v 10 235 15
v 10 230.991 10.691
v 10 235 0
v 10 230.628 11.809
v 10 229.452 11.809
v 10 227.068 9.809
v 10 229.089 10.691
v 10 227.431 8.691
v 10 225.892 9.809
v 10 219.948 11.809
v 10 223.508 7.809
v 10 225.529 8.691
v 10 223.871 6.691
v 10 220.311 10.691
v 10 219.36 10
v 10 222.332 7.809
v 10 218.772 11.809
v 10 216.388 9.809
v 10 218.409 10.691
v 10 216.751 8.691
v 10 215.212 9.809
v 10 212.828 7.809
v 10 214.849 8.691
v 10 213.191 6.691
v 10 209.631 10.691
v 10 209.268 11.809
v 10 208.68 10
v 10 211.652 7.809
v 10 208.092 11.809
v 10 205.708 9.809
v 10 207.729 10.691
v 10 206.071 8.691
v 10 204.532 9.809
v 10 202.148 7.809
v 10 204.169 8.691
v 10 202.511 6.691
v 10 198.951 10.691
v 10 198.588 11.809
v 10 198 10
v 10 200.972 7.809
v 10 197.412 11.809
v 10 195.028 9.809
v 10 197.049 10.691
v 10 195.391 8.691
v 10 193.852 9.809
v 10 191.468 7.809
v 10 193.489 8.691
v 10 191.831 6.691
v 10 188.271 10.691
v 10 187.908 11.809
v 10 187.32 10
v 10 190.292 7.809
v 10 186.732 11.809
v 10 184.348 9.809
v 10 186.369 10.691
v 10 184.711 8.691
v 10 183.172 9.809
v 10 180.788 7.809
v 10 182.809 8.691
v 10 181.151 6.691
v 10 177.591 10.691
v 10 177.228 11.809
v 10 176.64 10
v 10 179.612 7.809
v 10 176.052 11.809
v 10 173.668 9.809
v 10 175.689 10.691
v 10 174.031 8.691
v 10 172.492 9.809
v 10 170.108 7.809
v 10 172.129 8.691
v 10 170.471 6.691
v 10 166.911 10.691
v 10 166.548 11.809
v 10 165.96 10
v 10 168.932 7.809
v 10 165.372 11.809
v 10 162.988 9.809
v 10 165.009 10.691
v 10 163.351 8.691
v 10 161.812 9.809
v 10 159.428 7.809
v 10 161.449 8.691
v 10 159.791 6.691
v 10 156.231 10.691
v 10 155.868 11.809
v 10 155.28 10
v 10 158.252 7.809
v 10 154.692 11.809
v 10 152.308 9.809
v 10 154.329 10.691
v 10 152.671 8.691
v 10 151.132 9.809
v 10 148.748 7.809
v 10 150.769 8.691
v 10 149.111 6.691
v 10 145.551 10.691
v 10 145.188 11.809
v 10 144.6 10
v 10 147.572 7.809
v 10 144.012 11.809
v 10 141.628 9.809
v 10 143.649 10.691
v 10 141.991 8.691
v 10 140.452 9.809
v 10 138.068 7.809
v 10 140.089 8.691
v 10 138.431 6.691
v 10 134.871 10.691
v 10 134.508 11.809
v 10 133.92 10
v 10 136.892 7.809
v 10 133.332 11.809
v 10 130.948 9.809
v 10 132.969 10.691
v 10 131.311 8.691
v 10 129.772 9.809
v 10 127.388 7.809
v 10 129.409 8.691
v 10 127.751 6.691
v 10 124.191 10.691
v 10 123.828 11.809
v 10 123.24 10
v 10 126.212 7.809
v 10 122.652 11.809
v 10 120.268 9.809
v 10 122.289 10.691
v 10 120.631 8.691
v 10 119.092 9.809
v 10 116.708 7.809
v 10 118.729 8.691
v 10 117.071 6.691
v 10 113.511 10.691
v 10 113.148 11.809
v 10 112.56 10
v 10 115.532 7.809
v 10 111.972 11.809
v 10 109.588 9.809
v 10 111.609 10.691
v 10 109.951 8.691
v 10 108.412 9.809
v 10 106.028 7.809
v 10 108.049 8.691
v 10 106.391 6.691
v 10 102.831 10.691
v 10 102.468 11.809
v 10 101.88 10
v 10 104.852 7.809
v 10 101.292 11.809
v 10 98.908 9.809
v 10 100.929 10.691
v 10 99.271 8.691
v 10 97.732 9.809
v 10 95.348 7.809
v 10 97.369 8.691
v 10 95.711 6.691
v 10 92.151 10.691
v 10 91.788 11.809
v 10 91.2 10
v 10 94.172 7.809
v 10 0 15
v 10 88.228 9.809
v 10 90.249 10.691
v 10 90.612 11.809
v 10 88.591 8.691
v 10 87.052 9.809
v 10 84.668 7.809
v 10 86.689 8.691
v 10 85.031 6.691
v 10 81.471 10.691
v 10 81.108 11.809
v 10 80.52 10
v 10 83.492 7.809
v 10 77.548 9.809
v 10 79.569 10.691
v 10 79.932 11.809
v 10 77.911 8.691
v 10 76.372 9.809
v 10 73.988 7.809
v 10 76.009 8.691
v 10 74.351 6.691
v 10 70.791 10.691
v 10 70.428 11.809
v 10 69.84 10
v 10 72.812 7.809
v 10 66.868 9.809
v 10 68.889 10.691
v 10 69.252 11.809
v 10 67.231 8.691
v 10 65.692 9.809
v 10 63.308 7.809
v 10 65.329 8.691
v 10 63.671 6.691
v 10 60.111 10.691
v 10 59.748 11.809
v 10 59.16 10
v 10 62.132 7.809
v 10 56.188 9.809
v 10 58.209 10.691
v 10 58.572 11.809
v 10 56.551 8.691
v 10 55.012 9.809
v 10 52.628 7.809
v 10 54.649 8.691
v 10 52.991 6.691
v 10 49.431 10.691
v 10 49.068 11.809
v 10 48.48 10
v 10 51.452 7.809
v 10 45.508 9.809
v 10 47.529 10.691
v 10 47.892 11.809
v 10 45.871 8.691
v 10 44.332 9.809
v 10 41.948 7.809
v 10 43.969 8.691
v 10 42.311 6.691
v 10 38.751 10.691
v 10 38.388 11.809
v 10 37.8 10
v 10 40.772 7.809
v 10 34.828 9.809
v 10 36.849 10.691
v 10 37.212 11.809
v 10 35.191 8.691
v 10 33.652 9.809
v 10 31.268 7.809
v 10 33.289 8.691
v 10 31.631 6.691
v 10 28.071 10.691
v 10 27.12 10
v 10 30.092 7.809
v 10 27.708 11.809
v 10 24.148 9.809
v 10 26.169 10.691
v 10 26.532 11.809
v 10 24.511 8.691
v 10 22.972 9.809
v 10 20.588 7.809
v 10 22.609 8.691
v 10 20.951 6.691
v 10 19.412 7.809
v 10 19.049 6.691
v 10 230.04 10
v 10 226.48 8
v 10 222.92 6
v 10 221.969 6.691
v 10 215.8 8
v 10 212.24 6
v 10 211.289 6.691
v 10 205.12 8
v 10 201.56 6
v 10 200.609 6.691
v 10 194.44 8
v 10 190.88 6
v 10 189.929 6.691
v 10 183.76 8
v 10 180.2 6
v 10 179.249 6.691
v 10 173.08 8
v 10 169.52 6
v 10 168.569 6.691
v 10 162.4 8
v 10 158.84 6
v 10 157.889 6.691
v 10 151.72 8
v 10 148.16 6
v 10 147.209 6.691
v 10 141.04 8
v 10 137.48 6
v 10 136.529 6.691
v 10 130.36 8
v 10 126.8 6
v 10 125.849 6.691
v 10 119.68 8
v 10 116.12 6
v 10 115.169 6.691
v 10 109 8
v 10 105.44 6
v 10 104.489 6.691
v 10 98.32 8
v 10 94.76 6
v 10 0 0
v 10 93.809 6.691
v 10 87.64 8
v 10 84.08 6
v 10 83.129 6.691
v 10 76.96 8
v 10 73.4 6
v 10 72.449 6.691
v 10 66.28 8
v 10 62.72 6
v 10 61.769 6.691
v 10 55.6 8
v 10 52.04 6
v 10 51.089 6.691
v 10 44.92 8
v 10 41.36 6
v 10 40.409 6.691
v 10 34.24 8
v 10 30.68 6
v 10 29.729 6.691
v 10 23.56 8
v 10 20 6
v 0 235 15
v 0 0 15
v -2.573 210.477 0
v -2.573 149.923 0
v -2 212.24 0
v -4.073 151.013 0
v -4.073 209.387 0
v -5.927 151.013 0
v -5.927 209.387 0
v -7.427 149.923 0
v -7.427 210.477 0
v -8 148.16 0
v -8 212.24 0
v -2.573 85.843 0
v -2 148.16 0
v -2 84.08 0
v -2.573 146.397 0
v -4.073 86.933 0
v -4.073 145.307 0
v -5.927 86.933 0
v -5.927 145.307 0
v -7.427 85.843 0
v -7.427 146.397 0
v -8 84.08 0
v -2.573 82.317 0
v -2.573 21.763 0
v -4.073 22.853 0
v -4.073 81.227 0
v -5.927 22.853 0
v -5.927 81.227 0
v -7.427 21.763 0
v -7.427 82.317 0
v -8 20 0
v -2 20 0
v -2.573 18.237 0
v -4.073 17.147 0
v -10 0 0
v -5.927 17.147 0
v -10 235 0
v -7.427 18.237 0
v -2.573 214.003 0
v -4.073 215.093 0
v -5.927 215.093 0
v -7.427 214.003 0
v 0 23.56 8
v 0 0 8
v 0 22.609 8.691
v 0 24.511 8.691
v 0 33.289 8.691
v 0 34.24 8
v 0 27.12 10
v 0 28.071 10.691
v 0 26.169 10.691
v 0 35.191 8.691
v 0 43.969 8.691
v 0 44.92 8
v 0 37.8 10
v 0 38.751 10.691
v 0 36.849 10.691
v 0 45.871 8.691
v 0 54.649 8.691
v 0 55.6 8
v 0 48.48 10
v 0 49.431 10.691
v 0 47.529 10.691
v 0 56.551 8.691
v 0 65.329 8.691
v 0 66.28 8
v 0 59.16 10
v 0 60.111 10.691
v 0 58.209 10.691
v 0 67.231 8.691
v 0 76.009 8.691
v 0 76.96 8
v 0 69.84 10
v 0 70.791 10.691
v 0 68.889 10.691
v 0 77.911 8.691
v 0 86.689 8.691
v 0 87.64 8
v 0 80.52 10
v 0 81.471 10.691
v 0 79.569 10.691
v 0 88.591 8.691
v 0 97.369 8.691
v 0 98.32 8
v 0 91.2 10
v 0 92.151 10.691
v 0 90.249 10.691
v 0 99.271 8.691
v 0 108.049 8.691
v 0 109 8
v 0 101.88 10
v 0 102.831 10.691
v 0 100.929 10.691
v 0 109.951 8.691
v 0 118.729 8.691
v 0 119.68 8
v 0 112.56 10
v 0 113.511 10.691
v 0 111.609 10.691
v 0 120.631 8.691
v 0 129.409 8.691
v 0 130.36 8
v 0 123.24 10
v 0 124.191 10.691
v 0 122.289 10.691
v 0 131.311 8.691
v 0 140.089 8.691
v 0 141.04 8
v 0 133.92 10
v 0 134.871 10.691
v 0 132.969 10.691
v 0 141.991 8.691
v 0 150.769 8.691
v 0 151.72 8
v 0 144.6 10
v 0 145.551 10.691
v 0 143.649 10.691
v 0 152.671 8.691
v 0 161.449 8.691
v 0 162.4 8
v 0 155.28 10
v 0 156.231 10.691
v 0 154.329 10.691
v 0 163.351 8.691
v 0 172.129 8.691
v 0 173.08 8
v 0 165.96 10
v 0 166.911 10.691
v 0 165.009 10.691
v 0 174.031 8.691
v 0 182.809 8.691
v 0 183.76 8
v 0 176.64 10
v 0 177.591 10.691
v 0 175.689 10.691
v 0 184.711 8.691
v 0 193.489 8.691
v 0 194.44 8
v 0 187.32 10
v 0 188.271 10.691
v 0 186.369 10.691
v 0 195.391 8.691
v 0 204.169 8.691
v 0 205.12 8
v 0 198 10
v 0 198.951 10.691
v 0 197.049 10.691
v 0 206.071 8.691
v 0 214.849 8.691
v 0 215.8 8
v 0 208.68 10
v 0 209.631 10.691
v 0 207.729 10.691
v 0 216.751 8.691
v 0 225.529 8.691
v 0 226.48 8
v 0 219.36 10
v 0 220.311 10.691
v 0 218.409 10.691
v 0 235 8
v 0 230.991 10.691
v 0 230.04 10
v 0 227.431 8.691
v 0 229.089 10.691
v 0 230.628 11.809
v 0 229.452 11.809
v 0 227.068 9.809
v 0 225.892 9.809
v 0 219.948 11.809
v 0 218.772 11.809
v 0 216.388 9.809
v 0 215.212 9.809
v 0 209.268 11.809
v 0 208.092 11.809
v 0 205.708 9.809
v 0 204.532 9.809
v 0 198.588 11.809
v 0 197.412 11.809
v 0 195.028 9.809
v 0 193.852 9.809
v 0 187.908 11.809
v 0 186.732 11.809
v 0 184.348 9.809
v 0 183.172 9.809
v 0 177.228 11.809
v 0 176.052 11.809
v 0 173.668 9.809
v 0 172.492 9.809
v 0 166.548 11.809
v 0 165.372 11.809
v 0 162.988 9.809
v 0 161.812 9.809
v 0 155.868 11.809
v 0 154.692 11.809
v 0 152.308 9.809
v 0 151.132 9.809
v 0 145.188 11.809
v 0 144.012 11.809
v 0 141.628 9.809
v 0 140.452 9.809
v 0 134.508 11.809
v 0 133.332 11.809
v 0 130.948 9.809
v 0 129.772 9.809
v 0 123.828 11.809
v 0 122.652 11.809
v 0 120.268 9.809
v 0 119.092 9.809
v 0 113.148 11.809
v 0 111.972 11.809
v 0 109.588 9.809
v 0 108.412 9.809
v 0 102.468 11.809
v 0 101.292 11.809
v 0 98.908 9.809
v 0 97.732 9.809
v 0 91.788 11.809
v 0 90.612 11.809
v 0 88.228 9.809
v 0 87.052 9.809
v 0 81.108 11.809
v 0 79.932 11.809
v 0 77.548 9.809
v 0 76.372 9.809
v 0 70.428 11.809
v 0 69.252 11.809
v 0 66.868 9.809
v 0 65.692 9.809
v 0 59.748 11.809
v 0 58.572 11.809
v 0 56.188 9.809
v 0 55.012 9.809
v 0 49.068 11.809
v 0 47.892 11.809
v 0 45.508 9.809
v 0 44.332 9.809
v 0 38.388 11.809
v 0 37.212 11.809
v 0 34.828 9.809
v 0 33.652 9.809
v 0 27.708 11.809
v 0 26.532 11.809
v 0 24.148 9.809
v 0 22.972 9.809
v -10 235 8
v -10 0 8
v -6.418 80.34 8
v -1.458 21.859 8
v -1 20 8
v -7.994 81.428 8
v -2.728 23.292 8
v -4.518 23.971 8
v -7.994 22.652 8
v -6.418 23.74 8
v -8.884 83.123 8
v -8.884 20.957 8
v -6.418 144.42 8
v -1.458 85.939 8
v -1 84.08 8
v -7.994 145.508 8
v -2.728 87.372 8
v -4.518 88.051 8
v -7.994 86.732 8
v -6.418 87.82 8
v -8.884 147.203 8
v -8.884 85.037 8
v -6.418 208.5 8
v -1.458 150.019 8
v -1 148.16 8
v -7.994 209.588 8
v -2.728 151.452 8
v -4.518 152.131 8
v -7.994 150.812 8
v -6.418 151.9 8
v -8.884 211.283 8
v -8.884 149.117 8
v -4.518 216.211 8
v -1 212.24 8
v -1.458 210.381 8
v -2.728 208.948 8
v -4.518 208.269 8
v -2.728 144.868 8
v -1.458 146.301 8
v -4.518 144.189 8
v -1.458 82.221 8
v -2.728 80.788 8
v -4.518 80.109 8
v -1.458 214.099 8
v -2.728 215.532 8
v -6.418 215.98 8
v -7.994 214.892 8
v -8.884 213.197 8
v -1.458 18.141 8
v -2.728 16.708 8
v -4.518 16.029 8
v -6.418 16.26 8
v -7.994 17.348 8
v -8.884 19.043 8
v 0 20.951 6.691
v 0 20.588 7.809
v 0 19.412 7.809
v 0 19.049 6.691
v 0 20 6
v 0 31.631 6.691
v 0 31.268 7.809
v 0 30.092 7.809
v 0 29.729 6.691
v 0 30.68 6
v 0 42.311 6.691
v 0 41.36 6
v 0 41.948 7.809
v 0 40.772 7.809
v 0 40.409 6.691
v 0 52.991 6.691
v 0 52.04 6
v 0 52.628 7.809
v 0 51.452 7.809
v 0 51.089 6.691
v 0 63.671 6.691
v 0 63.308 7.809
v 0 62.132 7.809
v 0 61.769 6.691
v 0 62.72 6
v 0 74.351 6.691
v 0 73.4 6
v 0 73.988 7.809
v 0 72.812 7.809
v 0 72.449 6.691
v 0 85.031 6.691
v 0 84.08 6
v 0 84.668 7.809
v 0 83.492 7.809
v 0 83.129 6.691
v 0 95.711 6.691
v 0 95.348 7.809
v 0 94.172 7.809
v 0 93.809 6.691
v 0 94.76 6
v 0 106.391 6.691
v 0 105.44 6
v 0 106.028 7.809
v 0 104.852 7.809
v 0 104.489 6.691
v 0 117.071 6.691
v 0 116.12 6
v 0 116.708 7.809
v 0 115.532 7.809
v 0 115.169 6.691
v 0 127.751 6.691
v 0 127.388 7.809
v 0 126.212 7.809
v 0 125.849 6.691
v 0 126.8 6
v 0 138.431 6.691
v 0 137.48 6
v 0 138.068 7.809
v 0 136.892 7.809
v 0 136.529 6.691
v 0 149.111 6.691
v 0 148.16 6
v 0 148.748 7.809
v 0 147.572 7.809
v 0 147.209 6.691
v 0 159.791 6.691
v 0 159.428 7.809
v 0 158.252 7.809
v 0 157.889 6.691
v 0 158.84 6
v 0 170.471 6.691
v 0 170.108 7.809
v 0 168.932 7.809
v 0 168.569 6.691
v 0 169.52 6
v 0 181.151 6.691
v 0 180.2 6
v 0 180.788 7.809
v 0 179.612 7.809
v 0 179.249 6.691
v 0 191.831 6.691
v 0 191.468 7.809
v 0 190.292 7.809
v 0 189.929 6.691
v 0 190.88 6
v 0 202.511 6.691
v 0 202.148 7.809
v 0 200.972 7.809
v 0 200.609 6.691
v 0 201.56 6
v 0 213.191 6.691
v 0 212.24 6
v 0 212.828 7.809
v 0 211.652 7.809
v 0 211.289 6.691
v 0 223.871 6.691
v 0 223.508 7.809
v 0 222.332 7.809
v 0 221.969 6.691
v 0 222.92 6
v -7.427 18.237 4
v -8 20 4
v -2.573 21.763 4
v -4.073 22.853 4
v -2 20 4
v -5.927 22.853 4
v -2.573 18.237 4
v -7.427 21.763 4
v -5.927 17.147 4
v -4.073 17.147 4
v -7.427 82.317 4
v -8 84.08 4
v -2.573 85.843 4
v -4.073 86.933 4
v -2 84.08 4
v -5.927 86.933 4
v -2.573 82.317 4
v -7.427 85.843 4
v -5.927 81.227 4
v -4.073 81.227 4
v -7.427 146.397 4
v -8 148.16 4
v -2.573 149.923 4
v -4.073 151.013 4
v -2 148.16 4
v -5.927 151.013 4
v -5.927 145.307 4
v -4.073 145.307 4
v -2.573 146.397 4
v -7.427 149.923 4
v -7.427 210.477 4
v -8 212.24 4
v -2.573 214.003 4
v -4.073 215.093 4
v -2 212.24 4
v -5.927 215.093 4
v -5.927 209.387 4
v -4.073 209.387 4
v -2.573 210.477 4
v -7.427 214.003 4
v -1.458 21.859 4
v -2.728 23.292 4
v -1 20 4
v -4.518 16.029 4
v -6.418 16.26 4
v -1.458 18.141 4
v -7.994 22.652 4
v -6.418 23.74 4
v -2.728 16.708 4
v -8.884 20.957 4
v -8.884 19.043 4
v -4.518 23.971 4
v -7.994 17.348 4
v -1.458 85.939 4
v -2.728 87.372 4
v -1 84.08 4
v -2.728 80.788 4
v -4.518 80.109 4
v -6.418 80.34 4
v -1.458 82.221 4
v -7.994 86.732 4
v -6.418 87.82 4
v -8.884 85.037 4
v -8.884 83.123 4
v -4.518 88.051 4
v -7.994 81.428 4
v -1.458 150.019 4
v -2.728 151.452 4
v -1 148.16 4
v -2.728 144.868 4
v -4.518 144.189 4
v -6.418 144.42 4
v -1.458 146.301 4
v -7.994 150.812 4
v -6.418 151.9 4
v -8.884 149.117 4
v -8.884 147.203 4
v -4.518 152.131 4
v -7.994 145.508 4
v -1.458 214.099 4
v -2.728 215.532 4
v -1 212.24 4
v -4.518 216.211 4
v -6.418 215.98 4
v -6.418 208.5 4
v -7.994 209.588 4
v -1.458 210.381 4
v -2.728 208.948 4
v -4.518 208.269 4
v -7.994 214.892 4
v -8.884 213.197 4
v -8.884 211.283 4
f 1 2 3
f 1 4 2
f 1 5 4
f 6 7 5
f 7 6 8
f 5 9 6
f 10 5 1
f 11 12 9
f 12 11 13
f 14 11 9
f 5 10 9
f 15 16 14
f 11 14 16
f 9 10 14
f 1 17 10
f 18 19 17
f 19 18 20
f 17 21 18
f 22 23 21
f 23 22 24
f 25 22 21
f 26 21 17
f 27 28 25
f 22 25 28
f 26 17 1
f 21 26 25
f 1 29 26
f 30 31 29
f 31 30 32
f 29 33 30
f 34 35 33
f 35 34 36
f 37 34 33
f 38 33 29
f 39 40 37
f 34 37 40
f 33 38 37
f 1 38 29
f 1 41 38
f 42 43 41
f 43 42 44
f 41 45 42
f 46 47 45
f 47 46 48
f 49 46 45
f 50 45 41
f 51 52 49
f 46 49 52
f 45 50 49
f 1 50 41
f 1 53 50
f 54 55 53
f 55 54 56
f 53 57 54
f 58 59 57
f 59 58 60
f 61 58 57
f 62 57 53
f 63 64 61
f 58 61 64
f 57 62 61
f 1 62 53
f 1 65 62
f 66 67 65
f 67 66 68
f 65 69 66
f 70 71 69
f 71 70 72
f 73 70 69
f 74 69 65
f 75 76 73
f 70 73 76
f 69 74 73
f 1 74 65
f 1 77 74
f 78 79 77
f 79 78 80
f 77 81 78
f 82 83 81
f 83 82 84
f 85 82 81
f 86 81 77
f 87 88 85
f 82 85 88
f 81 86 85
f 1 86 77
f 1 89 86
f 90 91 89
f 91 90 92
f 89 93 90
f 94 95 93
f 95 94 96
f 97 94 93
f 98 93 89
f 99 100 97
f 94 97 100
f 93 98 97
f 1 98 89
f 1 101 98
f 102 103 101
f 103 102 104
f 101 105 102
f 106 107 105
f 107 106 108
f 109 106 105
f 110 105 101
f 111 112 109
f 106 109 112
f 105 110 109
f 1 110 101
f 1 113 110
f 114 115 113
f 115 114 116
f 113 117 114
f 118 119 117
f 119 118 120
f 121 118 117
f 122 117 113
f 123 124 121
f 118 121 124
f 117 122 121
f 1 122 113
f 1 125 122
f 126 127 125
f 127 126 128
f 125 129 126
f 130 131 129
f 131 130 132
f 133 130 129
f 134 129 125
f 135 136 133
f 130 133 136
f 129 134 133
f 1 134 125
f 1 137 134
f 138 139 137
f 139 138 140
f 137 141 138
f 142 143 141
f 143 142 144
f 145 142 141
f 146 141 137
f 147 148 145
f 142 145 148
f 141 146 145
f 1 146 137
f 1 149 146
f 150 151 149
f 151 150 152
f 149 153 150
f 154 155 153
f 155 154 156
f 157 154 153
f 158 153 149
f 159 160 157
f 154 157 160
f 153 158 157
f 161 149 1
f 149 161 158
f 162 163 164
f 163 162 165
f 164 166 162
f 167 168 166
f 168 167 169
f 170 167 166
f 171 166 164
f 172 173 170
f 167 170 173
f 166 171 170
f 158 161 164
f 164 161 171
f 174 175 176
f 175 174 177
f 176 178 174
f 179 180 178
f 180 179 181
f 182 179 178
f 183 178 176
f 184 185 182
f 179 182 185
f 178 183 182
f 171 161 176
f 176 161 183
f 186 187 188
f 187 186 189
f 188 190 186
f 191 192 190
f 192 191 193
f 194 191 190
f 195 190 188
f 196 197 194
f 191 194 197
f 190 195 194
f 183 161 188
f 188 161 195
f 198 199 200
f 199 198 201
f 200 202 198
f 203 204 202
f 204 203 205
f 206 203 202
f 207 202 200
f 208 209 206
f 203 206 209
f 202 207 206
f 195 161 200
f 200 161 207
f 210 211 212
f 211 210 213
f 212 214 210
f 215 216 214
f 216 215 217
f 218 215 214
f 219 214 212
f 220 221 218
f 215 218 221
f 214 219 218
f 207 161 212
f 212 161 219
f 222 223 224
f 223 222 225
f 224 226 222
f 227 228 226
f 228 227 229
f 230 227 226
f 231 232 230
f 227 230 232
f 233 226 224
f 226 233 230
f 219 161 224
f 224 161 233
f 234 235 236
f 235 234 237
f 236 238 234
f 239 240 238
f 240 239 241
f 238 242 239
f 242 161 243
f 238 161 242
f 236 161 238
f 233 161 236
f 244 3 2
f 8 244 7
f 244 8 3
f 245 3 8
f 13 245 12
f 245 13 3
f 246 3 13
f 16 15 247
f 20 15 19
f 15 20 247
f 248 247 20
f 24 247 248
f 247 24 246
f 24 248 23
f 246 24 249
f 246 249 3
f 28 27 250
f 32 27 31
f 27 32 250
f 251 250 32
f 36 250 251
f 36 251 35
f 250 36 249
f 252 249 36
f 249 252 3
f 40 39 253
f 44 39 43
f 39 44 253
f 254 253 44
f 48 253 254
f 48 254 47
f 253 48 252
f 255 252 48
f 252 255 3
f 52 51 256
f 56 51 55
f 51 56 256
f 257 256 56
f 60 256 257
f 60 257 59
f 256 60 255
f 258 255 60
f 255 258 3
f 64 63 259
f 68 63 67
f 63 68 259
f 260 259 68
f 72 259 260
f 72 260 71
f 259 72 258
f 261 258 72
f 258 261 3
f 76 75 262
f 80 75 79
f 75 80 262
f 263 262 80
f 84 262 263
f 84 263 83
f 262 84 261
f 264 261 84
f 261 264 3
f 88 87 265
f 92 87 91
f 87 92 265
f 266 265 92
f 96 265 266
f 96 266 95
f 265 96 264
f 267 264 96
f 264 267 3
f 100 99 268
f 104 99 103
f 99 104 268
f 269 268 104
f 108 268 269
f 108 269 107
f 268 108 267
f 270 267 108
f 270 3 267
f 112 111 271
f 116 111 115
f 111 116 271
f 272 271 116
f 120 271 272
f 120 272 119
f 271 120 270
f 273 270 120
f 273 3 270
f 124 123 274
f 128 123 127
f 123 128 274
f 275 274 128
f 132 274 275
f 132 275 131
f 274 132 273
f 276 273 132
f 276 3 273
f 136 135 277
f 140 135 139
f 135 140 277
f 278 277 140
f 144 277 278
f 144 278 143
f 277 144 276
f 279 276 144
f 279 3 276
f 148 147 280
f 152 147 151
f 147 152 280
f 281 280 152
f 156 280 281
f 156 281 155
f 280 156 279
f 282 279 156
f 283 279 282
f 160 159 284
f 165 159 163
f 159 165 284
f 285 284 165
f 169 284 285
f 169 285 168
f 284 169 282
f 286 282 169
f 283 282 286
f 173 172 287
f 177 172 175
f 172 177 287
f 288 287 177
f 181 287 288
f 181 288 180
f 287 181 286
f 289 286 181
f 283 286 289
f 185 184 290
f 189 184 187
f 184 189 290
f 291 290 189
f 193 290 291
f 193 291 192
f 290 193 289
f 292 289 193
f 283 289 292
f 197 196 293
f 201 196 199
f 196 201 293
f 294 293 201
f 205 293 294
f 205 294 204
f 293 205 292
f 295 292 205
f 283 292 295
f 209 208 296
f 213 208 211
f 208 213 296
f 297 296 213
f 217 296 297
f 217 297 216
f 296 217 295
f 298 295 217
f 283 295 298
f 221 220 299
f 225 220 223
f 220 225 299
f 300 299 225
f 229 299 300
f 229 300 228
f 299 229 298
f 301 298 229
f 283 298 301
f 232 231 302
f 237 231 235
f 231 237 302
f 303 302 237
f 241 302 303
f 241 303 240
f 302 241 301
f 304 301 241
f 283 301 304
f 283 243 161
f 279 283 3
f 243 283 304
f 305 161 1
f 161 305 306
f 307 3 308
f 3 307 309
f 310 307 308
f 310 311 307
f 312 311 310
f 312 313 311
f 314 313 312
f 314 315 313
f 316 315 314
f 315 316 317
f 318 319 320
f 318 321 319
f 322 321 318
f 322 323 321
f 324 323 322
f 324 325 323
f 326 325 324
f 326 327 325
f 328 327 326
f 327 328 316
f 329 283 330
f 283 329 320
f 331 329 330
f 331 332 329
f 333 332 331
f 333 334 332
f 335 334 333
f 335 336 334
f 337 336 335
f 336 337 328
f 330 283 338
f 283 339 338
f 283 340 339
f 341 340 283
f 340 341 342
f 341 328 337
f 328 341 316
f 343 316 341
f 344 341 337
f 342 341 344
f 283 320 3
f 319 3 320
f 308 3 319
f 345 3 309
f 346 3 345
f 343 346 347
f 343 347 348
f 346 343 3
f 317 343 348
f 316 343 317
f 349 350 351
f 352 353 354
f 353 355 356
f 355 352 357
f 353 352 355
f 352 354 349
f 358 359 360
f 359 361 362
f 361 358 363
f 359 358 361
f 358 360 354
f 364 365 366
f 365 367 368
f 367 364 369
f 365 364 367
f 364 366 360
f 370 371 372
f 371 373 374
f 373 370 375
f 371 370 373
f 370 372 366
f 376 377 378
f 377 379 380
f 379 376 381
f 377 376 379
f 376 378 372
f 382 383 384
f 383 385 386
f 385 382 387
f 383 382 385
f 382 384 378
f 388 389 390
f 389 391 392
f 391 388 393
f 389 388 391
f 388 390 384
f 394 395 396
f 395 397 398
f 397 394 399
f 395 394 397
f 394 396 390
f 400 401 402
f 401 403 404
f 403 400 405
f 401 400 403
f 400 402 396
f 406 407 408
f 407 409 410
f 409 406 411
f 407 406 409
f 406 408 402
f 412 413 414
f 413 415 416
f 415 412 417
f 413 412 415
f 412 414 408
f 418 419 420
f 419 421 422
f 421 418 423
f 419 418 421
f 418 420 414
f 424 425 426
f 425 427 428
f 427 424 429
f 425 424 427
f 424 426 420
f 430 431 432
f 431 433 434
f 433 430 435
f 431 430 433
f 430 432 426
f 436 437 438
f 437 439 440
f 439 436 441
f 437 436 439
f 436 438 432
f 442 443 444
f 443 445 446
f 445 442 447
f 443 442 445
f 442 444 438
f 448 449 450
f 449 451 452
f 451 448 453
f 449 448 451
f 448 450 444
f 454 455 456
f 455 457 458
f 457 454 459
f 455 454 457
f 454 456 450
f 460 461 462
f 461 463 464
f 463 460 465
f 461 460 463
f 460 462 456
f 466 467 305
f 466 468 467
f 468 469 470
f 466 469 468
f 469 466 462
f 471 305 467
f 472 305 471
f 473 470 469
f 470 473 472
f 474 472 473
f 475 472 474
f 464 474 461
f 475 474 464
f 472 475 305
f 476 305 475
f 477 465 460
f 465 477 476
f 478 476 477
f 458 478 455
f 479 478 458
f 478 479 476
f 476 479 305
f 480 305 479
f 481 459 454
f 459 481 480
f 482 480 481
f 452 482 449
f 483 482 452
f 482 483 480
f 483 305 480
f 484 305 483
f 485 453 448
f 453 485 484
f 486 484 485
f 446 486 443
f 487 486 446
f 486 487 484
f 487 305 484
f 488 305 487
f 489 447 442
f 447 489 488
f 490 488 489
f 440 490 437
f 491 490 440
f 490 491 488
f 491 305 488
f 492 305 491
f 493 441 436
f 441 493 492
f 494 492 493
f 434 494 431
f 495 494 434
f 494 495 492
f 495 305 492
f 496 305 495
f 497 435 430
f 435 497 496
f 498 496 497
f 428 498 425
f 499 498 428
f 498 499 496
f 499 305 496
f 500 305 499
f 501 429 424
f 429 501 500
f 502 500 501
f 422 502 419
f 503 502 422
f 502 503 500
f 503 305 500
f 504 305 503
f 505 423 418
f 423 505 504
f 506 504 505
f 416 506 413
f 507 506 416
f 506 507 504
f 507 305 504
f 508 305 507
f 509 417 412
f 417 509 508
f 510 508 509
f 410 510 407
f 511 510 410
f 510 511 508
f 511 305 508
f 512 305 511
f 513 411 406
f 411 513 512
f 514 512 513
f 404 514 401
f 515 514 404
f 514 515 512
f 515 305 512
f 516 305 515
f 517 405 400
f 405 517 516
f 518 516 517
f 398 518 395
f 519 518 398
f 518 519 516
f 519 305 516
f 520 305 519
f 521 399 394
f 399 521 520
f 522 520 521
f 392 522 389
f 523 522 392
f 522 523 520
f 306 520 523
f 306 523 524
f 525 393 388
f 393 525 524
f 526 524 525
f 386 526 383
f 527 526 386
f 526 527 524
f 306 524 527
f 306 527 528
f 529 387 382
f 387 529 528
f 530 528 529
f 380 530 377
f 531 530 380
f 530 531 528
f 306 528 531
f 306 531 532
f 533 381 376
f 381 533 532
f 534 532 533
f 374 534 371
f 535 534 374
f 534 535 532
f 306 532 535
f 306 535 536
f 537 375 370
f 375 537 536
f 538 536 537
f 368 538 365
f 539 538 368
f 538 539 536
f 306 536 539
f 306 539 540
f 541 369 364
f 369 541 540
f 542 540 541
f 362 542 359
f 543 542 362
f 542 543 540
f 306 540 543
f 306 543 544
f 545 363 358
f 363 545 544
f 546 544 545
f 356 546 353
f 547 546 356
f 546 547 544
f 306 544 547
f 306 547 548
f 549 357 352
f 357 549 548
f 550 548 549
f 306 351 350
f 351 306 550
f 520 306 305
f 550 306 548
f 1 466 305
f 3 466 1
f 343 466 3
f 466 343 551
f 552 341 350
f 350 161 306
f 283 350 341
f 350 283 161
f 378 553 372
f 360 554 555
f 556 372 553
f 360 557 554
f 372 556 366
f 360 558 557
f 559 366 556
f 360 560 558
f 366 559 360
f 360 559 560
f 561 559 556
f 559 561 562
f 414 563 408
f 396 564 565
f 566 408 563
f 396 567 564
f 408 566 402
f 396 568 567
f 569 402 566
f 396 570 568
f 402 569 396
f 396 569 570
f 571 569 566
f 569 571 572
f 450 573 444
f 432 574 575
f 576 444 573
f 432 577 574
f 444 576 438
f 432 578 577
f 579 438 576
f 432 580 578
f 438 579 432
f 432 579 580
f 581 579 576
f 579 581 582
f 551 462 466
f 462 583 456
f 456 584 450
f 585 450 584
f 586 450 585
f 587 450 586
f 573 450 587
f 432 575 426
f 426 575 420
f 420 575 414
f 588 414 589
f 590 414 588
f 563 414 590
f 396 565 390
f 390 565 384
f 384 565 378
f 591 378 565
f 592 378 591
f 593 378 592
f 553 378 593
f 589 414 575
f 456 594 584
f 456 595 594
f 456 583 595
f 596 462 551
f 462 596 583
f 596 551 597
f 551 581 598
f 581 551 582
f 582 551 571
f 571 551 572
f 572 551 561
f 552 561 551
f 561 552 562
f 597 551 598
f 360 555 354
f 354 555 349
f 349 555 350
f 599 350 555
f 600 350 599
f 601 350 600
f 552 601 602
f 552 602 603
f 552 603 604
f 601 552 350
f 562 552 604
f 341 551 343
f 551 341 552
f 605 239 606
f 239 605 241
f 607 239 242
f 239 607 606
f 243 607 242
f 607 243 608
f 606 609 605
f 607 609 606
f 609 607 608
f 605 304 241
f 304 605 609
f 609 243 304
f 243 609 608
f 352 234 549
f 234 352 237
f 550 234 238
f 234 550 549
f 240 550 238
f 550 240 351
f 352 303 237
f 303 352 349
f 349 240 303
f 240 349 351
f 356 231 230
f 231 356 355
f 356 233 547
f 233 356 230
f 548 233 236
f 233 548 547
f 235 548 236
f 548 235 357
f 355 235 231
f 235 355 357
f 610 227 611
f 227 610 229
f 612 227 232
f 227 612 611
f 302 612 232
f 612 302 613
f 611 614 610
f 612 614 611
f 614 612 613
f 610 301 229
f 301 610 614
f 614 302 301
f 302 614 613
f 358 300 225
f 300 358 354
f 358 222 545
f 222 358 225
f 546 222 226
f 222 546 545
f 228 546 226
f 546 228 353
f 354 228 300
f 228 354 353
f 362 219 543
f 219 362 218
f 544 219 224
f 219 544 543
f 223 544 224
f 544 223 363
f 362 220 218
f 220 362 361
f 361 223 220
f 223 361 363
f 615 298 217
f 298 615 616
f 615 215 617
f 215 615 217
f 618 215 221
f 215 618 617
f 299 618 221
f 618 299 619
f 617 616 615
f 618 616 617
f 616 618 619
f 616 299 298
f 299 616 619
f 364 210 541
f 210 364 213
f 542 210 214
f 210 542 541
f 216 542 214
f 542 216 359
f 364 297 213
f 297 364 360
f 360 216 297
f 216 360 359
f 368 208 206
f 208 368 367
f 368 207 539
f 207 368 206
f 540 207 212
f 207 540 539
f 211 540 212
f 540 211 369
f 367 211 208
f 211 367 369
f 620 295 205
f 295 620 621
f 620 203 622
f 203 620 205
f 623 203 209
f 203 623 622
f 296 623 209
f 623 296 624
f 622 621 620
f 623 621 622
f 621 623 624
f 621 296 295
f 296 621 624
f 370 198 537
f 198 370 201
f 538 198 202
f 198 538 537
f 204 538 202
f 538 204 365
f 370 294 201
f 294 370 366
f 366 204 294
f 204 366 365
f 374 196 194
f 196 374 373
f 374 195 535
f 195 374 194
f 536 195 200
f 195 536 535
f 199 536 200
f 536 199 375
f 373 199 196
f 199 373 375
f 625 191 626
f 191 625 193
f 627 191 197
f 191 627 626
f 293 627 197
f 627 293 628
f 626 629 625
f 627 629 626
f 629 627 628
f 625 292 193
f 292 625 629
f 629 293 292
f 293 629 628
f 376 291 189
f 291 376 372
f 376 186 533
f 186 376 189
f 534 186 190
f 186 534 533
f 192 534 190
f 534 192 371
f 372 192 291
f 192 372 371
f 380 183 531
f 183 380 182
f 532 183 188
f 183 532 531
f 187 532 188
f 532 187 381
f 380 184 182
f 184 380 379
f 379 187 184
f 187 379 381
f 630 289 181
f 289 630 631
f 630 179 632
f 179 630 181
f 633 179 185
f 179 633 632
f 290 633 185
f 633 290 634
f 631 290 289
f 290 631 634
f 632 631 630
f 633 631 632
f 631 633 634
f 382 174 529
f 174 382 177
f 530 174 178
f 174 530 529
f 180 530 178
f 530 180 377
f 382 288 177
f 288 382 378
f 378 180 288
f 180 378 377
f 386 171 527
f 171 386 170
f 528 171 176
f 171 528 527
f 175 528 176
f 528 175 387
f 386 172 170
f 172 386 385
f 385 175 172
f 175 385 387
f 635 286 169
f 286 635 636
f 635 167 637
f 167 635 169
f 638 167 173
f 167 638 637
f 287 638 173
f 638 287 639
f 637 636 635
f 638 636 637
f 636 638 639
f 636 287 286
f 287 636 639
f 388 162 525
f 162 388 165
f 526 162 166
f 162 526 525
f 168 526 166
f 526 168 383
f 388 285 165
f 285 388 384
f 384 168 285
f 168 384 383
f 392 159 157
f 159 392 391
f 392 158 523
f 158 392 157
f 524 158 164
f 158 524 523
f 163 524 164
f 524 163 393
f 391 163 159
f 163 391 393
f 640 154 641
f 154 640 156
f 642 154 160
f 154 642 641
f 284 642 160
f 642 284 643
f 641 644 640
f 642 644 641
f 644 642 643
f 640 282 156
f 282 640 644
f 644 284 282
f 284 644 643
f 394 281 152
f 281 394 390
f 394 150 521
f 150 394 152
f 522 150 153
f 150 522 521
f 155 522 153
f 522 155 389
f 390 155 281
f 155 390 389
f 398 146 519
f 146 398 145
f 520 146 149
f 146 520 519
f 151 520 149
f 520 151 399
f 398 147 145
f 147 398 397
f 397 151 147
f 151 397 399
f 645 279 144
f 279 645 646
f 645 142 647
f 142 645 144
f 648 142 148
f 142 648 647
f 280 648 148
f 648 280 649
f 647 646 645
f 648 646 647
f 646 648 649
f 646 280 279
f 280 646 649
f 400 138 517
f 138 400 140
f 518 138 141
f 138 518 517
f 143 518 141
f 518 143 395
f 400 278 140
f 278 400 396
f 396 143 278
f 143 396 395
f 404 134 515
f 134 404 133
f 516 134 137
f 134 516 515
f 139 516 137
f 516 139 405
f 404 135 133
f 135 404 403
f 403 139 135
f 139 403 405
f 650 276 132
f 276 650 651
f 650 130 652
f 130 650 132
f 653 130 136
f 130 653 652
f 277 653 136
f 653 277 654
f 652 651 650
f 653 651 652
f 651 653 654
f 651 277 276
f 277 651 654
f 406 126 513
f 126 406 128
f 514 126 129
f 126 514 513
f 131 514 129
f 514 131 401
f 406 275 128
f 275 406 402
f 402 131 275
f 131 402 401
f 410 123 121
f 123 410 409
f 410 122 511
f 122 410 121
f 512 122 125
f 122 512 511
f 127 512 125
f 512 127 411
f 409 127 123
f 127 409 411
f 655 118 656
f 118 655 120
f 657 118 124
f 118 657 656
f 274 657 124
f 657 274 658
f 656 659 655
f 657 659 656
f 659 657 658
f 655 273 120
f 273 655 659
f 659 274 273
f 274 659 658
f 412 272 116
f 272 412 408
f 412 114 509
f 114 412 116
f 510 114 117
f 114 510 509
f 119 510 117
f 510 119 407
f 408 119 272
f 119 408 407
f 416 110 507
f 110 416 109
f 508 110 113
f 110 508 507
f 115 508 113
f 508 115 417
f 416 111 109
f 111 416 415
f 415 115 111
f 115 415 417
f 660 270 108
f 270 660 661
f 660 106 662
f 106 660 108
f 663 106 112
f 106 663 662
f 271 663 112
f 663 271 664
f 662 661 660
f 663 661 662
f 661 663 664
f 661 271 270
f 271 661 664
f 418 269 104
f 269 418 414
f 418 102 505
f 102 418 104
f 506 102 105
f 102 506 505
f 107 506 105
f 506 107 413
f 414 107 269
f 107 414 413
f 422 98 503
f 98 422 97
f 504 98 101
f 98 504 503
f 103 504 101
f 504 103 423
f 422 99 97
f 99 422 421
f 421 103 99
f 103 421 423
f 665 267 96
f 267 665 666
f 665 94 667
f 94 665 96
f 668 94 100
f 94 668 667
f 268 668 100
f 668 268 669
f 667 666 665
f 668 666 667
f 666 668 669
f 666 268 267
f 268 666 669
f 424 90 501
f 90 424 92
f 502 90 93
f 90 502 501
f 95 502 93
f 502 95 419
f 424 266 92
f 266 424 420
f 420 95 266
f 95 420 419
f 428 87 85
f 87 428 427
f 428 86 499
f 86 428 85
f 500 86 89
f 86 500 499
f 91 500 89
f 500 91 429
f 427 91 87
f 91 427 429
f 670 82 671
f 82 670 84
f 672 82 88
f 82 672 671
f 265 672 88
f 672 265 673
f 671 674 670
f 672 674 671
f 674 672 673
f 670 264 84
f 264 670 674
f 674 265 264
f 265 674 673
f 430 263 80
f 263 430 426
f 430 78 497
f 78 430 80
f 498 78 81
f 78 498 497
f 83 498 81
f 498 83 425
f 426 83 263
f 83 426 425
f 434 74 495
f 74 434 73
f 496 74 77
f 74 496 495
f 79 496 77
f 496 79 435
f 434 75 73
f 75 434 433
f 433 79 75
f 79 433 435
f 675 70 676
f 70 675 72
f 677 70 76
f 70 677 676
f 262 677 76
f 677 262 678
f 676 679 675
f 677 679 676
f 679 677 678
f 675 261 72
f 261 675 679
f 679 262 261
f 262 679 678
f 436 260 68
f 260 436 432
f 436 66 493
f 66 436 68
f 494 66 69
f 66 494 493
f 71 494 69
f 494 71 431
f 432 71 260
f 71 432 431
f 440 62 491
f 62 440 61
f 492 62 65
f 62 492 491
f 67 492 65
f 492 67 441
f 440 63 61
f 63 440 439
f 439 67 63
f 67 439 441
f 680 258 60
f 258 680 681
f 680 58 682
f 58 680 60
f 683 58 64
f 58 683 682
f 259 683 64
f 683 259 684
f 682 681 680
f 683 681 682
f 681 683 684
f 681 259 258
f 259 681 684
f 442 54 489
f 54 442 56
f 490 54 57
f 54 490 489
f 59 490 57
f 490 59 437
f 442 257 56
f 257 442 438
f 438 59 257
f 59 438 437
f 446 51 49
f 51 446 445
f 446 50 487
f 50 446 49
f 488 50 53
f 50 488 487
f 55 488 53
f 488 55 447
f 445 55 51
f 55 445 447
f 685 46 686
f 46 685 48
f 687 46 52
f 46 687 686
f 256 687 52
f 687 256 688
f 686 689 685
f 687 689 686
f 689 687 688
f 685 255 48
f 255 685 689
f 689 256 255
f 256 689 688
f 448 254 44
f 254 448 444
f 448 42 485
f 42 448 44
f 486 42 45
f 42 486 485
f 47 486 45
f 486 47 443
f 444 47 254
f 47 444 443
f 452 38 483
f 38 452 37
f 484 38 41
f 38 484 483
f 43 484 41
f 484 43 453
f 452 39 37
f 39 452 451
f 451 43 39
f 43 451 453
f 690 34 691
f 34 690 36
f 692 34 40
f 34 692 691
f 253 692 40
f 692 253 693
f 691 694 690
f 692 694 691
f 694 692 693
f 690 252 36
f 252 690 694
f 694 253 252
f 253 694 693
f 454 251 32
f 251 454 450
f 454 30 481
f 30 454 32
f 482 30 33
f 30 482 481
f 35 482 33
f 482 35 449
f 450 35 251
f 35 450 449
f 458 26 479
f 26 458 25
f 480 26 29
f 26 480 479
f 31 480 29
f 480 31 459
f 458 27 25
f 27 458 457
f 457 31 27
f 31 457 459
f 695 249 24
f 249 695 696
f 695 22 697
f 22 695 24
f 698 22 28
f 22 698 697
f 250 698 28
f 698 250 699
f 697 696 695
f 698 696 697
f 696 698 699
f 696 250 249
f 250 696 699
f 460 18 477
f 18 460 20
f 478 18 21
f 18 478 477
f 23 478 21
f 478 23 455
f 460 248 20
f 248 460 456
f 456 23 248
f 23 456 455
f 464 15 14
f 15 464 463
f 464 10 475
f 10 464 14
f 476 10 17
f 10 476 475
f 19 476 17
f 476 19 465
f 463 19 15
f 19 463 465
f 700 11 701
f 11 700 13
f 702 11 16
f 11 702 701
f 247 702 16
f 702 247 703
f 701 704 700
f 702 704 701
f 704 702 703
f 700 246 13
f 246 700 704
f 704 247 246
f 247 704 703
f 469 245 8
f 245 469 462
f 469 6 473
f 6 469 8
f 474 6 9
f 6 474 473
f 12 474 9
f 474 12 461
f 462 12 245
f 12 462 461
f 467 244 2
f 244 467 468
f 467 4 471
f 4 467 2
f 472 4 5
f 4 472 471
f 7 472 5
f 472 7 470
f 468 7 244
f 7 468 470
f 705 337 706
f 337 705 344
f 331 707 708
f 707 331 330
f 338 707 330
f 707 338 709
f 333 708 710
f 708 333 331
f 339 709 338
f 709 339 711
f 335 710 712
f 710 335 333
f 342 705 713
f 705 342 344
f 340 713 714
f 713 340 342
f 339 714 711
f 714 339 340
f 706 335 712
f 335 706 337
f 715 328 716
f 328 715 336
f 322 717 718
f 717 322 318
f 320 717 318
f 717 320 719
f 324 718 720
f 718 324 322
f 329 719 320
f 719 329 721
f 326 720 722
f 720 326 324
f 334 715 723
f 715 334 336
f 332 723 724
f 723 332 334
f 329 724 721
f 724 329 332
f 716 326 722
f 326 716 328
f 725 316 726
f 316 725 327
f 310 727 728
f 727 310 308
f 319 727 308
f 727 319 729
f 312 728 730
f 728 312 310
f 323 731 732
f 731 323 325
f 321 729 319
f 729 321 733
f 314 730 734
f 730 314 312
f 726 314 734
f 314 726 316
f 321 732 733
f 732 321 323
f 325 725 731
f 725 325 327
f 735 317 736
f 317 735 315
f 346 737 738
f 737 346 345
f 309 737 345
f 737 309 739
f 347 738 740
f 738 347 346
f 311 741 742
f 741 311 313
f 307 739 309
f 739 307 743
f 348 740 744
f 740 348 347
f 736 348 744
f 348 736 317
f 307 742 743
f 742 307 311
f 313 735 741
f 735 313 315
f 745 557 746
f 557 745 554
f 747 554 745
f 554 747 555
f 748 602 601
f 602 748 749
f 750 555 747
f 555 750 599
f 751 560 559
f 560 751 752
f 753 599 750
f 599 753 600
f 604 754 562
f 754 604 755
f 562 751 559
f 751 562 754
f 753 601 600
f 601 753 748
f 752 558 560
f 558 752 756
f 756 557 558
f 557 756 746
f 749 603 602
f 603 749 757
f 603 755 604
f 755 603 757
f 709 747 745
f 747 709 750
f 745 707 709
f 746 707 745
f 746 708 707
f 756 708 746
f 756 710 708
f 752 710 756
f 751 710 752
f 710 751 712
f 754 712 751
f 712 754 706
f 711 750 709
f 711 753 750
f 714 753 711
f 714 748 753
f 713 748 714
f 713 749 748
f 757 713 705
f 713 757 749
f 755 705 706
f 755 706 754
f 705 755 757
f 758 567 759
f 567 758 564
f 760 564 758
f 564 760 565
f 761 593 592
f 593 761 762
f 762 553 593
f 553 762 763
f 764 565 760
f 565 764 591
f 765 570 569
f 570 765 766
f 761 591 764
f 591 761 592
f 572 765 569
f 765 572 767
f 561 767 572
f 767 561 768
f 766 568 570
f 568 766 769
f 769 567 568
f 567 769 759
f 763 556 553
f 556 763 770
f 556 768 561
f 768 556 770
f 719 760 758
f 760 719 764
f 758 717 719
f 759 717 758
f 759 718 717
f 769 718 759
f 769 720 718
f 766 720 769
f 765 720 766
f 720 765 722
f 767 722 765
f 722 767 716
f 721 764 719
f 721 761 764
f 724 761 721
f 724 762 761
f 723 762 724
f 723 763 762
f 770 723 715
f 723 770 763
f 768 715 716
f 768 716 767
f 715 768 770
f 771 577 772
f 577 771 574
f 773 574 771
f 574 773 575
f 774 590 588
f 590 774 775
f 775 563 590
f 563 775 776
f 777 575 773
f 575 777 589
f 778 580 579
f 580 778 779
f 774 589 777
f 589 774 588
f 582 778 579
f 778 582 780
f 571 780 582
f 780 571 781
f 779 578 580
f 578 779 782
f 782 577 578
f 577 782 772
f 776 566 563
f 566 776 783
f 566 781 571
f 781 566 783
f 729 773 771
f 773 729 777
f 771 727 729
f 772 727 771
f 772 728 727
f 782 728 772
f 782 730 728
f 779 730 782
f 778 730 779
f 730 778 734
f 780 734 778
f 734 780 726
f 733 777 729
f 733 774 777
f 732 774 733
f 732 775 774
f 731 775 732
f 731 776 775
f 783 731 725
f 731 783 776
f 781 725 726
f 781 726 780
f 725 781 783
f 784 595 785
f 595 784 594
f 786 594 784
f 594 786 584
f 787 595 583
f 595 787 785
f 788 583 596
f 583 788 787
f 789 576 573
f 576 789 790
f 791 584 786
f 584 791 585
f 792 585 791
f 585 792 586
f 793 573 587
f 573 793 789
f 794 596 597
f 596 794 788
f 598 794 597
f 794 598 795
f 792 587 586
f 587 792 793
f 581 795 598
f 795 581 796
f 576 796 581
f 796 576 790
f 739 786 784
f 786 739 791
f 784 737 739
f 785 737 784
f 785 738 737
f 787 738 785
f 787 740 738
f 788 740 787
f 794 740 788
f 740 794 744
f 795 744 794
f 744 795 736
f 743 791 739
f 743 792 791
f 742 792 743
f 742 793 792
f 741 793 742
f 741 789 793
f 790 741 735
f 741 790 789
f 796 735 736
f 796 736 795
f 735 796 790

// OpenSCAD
strSpc = 3.56;
hR = 1;
barX = 10;
barY = 235;//250;
barZ = 15;
nKeys = 60;
osetY = 20;
osetZ = 10;
scrR = 3.0;//1.5;
scrHdR = 4;
difference(){
    positives();
    negatives();
}

module negatives(){
    //Pass-through holes for strings:
for (i = [0 : 1 : (nKeys-1)]) {
    translate([0,i*strSpc+osetY,osetZ+(i%3)*2-3]) rotate([0,90,0]) cylinder(barX,hR,hR);
}
    //Mounting holes for screws:
for (i = [0 : 18 : (nKeys)]) {
    translate([-barX/2,i*strSpc+osetY,0]) rotate([0,0,0]) cylinder(osetZ,scrR,scrR);
}
    //Countersink holes for screw heads:
for (i = [0 : 18 : (nKeys)]) {
    translate([-barX/2,i*strSpc+osetY,osetZ-2-4]) rotate([0,0,0]) cylinder(4,scrHdR,scrHdR);
}
}

module positives(){
    cube([barX,barY,barZ]);
    translate([-barX,0,0]) cube([barX,barY,osetZ-2]);
}
